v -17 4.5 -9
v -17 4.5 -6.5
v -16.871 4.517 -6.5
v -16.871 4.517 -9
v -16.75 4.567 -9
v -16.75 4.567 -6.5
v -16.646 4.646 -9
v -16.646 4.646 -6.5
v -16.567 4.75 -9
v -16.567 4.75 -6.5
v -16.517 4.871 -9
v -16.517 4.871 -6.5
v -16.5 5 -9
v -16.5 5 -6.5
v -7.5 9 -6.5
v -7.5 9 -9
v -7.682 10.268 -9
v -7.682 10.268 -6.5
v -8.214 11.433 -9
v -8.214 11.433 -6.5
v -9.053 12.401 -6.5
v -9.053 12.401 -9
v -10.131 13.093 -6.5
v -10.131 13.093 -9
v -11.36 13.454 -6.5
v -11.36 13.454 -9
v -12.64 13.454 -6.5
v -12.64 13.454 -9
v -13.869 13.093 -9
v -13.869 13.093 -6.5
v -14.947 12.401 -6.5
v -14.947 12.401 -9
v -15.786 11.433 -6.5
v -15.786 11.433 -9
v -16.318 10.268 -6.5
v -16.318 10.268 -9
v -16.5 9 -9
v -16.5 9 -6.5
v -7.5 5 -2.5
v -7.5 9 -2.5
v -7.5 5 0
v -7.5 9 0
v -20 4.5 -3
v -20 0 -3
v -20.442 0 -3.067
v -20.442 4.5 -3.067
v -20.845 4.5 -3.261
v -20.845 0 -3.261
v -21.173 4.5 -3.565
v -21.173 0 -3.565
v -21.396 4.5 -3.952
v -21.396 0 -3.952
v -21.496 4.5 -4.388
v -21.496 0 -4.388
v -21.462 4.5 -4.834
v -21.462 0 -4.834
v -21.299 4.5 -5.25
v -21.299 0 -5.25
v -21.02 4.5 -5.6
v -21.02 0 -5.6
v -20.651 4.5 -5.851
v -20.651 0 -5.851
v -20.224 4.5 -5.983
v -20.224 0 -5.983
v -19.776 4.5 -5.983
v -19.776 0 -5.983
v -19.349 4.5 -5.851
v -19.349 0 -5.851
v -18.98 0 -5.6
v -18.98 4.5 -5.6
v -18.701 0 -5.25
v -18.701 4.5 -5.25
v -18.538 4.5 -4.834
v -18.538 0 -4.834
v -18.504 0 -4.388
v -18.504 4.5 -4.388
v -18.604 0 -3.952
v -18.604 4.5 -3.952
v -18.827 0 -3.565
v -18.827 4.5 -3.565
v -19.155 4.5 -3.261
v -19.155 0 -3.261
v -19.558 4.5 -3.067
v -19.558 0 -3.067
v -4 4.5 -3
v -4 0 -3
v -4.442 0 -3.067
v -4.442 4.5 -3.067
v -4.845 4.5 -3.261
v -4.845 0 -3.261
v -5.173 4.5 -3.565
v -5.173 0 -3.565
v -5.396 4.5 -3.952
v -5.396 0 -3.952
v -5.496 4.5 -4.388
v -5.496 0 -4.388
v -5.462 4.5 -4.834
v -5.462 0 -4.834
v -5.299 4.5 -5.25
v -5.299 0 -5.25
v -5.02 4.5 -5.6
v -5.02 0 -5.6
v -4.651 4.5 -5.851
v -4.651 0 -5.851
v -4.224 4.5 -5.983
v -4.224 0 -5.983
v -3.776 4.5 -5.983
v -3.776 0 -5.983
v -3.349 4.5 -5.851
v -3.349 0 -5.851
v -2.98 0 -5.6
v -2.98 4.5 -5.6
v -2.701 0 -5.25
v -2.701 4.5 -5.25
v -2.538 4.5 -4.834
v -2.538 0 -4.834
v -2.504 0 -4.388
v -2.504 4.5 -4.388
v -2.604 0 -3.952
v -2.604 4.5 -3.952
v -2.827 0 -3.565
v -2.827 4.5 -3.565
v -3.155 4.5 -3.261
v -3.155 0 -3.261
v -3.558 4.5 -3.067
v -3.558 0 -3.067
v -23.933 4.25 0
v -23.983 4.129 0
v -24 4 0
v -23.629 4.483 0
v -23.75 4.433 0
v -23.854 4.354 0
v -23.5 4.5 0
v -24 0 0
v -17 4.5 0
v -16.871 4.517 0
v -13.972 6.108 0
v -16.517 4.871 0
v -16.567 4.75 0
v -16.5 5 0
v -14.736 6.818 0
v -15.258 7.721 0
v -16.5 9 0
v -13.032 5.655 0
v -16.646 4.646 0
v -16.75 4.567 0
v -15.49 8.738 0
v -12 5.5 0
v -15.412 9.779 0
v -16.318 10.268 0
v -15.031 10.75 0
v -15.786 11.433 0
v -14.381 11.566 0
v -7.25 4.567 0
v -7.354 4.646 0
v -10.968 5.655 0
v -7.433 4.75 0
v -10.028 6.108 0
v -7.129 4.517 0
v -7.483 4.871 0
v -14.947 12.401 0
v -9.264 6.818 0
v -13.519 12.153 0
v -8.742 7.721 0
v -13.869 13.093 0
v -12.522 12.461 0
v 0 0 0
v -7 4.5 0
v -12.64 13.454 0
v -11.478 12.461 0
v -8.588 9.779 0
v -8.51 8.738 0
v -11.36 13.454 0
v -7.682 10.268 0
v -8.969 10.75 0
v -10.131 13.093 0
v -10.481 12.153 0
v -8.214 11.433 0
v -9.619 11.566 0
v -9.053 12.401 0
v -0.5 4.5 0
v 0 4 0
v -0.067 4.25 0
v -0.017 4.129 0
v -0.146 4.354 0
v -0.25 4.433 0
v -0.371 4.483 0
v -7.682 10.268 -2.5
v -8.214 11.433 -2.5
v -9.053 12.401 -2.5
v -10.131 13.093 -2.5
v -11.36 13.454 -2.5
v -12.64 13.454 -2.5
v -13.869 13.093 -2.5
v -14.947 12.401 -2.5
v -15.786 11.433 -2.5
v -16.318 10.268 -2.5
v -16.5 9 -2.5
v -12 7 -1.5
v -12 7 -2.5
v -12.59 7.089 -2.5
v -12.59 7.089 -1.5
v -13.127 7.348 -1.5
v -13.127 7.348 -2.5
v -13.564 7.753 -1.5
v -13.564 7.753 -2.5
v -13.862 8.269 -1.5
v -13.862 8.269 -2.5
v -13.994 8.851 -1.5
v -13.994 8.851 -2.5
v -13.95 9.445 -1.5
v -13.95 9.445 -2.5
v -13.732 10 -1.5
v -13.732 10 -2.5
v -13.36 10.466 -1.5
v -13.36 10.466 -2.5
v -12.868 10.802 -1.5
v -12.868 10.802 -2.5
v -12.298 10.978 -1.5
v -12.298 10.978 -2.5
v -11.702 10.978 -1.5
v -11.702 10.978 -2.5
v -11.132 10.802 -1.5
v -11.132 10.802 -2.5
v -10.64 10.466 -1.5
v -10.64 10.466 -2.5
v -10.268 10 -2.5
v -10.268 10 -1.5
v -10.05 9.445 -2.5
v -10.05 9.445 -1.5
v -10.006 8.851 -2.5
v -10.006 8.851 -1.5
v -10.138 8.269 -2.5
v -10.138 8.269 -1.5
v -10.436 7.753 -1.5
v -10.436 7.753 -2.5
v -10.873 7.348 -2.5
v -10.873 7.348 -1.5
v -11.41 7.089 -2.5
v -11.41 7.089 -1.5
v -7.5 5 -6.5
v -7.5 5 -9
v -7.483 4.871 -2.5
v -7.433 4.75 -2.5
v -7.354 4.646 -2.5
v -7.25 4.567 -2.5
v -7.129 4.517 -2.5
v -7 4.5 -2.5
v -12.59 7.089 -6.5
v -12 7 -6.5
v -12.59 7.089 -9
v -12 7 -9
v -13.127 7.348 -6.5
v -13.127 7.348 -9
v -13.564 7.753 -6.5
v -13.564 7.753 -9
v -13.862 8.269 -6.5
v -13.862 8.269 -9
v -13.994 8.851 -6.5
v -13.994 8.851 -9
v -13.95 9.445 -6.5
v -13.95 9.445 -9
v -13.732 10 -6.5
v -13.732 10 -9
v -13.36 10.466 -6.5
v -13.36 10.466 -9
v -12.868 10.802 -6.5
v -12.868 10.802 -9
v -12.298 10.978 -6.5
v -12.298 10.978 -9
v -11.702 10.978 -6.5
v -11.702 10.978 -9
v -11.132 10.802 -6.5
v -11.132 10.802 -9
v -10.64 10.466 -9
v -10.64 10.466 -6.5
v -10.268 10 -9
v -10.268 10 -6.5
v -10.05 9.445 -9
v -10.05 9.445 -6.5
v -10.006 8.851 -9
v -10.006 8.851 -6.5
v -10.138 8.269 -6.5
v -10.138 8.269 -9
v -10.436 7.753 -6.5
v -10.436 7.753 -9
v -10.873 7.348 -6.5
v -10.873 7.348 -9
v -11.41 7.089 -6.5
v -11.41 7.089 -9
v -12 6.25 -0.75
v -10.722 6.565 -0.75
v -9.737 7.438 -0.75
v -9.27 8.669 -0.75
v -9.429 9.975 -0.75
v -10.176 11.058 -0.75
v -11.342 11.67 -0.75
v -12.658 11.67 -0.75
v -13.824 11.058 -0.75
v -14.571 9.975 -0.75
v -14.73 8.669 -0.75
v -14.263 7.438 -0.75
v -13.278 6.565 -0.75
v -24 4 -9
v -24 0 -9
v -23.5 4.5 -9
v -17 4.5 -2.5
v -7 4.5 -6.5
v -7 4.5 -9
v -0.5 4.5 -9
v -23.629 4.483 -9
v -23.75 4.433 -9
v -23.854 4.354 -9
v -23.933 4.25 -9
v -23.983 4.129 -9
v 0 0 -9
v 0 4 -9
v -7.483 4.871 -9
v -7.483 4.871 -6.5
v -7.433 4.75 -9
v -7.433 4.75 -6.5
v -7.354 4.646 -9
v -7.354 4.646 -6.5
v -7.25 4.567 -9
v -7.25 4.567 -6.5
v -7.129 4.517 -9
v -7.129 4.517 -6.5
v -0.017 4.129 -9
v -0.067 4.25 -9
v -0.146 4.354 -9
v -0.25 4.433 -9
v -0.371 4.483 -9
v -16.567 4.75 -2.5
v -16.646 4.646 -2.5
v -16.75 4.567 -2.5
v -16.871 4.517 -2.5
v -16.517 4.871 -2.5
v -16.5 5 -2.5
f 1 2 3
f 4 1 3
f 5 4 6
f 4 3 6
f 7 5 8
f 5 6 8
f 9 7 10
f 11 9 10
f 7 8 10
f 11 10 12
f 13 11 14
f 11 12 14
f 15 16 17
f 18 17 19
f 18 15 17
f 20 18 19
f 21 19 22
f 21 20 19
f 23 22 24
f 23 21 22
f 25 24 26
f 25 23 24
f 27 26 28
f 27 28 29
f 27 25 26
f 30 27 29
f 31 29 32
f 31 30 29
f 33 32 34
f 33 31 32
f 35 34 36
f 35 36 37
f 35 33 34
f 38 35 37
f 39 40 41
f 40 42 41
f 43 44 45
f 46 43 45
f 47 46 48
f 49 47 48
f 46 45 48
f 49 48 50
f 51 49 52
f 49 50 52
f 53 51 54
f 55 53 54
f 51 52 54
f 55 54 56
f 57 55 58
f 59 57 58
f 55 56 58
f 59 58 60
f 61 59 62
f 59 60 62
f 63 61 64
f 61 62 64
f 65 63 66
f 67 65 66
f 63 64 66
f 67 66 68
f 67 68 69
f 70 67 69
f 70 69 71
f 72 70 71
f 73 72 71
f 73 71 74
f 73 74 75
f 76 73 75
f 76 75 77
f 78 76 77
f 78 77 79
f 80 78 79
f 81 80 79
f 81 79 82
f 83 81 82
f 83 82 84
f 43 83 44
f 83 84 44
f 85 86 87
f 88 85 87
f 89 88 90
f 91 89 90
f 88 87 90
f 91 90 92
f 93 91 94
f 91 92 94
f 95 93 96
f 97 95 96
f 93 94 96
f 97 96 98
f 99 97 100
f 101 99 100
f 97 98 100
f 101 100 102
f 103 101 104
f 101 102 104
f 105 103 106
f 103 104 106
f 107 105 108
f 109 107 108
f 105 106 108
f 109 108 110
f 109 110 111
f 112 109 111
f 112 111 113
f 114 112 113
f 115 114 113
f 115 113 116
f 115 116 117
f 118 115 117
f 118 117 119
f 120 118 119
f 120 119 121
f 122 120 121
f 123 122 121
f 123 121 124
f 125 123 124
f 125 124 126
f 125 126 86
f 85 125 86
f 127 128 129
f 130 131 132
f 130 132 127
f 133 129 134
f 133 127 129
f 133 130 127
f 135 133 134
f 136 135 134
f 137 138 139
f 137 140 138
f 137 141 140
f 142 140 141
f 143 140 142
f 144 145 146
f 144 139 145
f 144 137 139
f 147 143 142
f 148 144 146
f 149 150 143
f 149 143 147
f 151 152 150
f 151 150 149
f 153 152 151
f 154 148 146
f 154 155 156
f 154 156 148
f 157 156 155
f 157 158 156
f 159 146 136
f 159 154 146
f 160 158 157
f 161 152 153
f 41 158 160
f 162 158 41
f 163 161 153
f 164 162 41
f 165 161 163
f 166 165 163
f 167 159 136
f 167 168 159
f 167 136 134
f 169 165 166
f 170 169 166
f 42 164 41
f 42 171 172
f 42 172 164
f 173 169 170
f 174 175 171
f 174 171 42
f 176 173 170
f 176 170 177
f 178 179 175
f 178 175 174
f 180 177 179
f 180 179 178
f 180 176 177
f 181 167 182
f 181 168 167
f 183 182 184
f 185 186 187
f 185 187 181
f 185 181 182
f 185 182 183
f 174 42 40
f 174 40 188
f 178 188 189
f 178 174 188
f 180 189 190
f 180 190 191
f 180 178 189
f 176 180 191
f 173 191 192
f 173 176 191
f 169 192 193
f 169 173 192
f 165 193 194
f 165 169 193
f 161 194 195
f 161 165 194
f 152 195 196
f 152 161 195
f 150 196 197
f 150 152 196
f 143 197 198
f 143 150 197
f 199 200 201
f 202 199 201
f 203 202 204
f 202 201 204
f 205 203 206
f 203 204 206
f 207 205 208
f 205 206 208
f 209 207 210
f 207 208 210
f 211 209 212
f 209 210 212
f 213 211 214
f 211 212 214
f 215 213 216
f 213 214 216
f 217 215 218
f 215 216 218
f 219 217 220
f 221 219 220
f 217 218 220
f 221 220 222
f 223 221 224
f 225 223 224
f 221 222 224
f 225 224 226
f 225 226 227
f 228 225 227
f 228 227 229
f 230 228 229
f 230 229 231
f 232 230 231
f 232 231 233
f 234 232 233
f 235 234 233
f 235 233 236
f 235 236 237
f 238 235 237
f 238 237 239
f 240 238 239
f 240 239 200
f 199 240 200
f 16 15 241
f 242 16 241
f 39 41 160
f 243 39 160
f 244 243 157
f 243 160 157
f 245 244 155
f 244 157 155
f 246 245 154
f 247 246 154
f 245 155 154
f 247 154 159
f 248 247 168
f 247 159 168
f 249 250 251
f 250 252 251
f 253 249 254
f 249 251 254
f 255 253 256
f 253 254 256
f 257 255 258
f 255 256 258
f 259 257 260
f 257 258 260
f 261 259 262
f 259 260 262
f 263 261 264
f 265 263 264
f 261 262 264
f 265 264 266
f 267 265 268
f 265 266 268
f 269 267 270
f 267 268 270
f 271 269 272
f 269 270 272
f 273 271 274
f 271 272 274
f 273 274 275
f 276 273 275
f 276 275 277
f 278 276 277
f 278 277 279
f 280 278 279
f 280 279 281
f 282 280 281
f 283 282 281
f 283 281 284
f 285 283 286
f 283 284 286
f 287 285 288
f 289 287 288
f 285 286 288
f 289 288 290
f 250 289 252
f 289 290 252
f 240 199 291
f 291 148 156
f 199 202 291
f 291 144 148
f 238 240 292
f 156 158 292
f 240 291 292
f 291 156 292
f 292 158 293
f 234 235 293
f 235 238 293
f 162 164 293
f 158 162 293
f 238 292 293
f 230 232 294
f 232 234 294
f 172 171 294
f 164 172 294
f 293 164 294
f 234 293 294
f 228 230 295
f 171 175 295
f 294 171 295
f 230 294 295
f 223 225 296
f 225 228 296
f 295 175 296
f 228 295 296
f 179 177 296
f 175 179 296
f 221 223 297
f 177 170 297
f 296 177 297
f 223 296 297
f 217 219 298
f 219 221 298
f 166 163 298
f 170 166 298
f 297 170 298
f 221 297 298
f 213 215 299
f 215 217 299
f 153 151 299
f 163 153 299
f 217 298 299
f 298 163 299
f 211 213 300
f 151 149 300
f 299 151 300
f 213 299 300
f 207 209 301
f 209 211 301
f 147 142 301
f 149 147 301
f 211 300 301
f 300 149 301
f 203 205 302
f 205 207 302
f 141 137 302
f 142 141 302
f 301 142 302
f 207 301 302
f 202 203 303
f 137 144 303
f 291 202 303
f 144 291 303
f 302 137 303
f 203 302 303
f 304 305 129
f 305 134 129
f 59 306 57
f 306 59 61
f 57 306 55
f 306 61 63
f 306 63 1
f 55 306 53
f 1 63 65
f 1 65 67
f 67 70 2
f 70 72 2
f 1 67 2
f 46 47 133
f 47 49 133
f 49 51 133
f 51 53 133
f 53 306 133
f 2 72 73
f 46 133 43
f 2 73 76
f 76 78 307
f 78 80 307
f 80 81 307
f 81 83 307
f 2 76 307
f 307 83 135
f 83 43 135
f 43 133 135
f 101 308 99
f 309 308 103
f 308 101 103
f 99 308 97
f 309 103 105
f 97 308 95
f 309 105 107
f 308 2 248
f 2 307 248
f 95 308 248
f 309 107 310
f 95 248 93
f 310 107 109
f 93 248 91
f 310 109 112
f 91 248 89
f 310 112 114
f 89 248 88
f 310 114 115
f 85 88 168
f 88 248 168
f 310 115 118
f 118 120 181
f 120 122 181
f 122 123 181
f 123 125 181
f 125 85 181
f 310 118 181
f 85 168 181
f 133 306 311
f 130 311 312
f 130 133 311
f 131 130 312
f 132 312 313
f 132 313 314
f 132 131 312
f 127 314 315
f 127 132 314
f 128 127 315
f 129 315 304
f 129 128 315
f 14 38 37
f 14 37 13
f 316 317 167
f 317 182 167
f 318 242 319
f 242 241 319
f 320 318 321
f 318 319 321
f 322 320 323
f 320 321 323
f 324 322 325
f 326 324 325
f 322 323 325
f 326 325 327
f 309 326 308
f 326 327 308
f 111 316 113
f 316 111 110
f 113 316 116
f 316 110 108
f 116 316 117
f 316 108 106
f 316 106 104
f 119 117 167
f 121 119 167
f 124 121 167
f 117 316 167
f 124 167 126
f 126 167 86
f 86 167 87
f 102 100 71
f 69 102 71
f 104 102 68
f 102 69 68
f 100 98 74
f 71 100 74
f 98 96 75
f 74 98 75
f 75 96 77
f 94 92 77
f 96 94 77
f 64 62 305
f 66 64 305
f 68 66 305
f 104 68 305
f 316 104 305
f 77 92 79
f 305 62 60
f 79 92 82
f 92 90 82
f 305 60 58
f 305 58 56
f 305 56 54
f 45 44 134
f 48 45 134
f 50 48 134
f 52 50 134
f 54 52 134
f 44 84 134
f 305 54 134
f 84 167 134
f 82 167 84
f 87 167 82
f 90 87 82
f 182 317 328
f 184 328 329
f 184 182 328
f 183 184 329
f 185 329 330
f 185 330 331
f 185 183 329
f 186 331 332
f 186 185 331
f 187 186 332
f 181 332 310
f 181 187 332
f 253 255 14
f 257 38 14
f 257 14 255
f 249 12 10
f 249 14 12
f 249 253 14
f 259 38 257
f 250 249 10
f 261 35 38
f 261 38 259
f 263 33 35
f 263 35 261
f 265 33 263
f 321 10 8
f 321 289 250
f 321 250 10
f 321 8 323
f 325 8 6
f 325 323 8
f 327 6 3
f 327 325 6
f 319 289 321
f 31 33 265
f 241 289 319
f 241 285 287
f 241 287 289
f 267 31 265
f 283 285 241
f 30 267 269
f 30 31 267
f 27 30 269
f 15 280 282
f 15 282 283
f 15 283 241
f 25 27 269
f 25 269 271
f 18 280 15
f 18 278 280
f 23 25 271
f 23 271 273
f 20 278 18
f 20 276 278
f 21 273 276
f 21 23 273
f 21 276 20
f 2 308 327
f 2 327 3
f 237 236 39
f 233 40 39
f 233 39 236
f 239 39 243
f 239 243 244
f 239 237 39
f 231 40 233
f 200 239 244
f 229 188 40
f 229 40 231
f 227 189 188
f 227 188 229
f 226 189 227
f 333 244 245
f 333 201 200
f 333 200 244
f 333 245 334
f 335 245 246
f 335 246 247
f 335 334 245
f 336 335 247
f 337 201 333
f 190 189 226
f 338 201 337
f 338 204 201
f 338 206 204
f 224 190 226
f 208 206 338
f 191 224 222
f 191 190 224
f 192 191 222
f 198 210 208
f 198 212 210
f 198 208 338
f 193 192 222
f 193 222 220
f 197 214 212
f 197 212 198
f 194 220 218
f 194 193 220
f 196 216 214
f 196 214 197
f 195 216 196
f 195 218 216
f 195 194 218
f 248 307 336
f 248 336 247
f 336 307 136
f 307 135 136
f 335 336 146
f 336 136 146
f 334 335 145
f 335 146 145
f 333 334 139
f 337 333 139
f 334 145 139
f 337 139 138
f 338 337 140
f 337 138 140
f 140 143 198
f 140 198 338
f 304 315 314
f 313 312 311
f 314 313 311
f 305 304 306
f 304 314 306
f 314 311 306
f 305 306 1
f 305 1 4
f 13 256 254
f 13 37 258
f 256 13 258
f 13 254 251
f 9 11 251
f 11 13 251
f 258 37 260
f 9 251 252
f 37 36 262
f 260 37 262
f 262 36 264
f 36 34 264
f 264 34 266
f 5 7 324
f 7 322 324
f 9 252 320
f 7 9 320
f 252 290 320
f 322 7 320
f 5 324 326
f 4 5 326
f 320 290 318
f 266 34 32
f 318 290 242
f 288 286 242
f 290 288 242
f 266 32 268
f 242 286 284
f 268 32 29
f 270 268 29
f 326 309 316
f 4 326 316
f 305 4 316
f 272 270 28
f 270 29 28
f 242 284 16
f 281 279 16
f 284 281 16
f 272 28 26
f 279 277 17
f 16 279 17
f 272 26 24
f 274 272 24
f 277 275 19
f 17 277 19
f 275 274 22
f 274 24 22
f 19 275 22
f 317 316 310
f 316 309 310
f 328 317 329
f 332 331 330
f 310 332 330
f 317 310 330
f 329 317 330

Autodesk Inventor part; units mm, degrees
ref_plane "YZ Plane" through (0, 0, 0) normal (1, 0, 0) x (0, 1, 0)
ref_plane "XY Plane" through (0, 0, 0) normal (0, 0, 1) x (1, 0, 0)
sketch "Boceto1" plane through (0, 0, 0) normal (0, 0, 1) x (1, 0, 0)
  line L0 (0, 0) -> (-24, 0)
  line L1 (-24, 0) -> (-24, 4)
  line L2 (-23.5, 4.5) -> (-0.5, 4.5)
  line L3 (0, 4) -> (0, 0)
  arc A0 (-23.5, 4.5) -> (-24, 4) centre (-23.5, 4) ccw
  arc A1 (0, 4) -> (-0.5, 4.5) centre (-0.5, 4) ccw
  line L4 (-12, 0) -> (-12, 13.5) construction
  circle A2 centre (-12, 9) radius 2
  arc A3 (-7.5, 9) -> (-16.5, 9) centre (-12, 9) ccw
  line L5 (-16.5, 9) -> (-16.5, 5)
  line L6 (-7.5, 9) -> (-7.5, 5)
  arc A4 (-17, 4.5) -> (-16.5, 5) centre (-17, 5) ccw
  arc A5 (-7.5, 5) -> (-7, 4.5) centre (-7, 5) ccw
  dimension "d0" = 24
  dimension "d2" = 1
  dimension "d3" = 1
  dimension "d4" = 4.5
  dimension "d5" = 4.5
  dimension "d6" = 4
  dimension "d7" = 9
  dimension "d8" = 1
  dimension "d9" = 1
extrude "Extrusión1" add sketch "Boceto1" against normal blind 9 contours L0 L1 A0 L2 A1 L3 | L2 A4 L5 A3 L6 A5 | A2
ref_plane "Plano de trabajo1" through (0, 13.5, 0) normal (0, 1, 0) x (-1, 0, 0)
sketch "Boceto2" plane through (0, 13.5, 0) normal (0, 1, 0) x (-1, 0, 0)
  line L0 (24, 0) -> (24, -9) projected
  line L1 (24, -4.5) -> (0, -4.5) construction
  line L2 (0, 0) -> (0, -9) projected
  line L3 (7.5, -9) -> (16.5, -9) projected
  line L4 (12, -9) -> (12, 0) construction
  line L5 (24, -6.5) -> (0, -6.5)
  line L6 (0, -6.5) -> (0, -2.5)
  line L7 (0, -2.5) -> (24, -2.5)
  line L8 (24, -2.5) -> (24, -6.5)
  circle A0 centre (20, -4.5) radius 1.5
  circle A1 centre (4, -4.5) radius 1.5
  point P0 (0, -4.5)
  point P1 (12, -6.5)
  point P2 (0, -6.5)
  dimension "d13" = 2
  dimension "d14" = 8
  dimension "d15" = 8
  dimension "d16" = 3
  dimension "d17" = 3
extrude "Extrusión2" cut sketch "Boceto2" against normal blind 9
hole "Agujero1" at (-20, 13.5, -4.5) at (-4, 13.5, -4.5) direction (0, -1, 0) diameter 3 end through all
hole "Agujero2" at (-12, 9, 0) direction (0, 0, -1) diameter 4 end through all countersink diameter 7 countersink angle 90
thread "Rosca1" size "M4x0.7" class "6H" standard "ANSI Metric M Profile" full length
equation "\"d15\" = d14"
properties part number "Hudson 1-72"
